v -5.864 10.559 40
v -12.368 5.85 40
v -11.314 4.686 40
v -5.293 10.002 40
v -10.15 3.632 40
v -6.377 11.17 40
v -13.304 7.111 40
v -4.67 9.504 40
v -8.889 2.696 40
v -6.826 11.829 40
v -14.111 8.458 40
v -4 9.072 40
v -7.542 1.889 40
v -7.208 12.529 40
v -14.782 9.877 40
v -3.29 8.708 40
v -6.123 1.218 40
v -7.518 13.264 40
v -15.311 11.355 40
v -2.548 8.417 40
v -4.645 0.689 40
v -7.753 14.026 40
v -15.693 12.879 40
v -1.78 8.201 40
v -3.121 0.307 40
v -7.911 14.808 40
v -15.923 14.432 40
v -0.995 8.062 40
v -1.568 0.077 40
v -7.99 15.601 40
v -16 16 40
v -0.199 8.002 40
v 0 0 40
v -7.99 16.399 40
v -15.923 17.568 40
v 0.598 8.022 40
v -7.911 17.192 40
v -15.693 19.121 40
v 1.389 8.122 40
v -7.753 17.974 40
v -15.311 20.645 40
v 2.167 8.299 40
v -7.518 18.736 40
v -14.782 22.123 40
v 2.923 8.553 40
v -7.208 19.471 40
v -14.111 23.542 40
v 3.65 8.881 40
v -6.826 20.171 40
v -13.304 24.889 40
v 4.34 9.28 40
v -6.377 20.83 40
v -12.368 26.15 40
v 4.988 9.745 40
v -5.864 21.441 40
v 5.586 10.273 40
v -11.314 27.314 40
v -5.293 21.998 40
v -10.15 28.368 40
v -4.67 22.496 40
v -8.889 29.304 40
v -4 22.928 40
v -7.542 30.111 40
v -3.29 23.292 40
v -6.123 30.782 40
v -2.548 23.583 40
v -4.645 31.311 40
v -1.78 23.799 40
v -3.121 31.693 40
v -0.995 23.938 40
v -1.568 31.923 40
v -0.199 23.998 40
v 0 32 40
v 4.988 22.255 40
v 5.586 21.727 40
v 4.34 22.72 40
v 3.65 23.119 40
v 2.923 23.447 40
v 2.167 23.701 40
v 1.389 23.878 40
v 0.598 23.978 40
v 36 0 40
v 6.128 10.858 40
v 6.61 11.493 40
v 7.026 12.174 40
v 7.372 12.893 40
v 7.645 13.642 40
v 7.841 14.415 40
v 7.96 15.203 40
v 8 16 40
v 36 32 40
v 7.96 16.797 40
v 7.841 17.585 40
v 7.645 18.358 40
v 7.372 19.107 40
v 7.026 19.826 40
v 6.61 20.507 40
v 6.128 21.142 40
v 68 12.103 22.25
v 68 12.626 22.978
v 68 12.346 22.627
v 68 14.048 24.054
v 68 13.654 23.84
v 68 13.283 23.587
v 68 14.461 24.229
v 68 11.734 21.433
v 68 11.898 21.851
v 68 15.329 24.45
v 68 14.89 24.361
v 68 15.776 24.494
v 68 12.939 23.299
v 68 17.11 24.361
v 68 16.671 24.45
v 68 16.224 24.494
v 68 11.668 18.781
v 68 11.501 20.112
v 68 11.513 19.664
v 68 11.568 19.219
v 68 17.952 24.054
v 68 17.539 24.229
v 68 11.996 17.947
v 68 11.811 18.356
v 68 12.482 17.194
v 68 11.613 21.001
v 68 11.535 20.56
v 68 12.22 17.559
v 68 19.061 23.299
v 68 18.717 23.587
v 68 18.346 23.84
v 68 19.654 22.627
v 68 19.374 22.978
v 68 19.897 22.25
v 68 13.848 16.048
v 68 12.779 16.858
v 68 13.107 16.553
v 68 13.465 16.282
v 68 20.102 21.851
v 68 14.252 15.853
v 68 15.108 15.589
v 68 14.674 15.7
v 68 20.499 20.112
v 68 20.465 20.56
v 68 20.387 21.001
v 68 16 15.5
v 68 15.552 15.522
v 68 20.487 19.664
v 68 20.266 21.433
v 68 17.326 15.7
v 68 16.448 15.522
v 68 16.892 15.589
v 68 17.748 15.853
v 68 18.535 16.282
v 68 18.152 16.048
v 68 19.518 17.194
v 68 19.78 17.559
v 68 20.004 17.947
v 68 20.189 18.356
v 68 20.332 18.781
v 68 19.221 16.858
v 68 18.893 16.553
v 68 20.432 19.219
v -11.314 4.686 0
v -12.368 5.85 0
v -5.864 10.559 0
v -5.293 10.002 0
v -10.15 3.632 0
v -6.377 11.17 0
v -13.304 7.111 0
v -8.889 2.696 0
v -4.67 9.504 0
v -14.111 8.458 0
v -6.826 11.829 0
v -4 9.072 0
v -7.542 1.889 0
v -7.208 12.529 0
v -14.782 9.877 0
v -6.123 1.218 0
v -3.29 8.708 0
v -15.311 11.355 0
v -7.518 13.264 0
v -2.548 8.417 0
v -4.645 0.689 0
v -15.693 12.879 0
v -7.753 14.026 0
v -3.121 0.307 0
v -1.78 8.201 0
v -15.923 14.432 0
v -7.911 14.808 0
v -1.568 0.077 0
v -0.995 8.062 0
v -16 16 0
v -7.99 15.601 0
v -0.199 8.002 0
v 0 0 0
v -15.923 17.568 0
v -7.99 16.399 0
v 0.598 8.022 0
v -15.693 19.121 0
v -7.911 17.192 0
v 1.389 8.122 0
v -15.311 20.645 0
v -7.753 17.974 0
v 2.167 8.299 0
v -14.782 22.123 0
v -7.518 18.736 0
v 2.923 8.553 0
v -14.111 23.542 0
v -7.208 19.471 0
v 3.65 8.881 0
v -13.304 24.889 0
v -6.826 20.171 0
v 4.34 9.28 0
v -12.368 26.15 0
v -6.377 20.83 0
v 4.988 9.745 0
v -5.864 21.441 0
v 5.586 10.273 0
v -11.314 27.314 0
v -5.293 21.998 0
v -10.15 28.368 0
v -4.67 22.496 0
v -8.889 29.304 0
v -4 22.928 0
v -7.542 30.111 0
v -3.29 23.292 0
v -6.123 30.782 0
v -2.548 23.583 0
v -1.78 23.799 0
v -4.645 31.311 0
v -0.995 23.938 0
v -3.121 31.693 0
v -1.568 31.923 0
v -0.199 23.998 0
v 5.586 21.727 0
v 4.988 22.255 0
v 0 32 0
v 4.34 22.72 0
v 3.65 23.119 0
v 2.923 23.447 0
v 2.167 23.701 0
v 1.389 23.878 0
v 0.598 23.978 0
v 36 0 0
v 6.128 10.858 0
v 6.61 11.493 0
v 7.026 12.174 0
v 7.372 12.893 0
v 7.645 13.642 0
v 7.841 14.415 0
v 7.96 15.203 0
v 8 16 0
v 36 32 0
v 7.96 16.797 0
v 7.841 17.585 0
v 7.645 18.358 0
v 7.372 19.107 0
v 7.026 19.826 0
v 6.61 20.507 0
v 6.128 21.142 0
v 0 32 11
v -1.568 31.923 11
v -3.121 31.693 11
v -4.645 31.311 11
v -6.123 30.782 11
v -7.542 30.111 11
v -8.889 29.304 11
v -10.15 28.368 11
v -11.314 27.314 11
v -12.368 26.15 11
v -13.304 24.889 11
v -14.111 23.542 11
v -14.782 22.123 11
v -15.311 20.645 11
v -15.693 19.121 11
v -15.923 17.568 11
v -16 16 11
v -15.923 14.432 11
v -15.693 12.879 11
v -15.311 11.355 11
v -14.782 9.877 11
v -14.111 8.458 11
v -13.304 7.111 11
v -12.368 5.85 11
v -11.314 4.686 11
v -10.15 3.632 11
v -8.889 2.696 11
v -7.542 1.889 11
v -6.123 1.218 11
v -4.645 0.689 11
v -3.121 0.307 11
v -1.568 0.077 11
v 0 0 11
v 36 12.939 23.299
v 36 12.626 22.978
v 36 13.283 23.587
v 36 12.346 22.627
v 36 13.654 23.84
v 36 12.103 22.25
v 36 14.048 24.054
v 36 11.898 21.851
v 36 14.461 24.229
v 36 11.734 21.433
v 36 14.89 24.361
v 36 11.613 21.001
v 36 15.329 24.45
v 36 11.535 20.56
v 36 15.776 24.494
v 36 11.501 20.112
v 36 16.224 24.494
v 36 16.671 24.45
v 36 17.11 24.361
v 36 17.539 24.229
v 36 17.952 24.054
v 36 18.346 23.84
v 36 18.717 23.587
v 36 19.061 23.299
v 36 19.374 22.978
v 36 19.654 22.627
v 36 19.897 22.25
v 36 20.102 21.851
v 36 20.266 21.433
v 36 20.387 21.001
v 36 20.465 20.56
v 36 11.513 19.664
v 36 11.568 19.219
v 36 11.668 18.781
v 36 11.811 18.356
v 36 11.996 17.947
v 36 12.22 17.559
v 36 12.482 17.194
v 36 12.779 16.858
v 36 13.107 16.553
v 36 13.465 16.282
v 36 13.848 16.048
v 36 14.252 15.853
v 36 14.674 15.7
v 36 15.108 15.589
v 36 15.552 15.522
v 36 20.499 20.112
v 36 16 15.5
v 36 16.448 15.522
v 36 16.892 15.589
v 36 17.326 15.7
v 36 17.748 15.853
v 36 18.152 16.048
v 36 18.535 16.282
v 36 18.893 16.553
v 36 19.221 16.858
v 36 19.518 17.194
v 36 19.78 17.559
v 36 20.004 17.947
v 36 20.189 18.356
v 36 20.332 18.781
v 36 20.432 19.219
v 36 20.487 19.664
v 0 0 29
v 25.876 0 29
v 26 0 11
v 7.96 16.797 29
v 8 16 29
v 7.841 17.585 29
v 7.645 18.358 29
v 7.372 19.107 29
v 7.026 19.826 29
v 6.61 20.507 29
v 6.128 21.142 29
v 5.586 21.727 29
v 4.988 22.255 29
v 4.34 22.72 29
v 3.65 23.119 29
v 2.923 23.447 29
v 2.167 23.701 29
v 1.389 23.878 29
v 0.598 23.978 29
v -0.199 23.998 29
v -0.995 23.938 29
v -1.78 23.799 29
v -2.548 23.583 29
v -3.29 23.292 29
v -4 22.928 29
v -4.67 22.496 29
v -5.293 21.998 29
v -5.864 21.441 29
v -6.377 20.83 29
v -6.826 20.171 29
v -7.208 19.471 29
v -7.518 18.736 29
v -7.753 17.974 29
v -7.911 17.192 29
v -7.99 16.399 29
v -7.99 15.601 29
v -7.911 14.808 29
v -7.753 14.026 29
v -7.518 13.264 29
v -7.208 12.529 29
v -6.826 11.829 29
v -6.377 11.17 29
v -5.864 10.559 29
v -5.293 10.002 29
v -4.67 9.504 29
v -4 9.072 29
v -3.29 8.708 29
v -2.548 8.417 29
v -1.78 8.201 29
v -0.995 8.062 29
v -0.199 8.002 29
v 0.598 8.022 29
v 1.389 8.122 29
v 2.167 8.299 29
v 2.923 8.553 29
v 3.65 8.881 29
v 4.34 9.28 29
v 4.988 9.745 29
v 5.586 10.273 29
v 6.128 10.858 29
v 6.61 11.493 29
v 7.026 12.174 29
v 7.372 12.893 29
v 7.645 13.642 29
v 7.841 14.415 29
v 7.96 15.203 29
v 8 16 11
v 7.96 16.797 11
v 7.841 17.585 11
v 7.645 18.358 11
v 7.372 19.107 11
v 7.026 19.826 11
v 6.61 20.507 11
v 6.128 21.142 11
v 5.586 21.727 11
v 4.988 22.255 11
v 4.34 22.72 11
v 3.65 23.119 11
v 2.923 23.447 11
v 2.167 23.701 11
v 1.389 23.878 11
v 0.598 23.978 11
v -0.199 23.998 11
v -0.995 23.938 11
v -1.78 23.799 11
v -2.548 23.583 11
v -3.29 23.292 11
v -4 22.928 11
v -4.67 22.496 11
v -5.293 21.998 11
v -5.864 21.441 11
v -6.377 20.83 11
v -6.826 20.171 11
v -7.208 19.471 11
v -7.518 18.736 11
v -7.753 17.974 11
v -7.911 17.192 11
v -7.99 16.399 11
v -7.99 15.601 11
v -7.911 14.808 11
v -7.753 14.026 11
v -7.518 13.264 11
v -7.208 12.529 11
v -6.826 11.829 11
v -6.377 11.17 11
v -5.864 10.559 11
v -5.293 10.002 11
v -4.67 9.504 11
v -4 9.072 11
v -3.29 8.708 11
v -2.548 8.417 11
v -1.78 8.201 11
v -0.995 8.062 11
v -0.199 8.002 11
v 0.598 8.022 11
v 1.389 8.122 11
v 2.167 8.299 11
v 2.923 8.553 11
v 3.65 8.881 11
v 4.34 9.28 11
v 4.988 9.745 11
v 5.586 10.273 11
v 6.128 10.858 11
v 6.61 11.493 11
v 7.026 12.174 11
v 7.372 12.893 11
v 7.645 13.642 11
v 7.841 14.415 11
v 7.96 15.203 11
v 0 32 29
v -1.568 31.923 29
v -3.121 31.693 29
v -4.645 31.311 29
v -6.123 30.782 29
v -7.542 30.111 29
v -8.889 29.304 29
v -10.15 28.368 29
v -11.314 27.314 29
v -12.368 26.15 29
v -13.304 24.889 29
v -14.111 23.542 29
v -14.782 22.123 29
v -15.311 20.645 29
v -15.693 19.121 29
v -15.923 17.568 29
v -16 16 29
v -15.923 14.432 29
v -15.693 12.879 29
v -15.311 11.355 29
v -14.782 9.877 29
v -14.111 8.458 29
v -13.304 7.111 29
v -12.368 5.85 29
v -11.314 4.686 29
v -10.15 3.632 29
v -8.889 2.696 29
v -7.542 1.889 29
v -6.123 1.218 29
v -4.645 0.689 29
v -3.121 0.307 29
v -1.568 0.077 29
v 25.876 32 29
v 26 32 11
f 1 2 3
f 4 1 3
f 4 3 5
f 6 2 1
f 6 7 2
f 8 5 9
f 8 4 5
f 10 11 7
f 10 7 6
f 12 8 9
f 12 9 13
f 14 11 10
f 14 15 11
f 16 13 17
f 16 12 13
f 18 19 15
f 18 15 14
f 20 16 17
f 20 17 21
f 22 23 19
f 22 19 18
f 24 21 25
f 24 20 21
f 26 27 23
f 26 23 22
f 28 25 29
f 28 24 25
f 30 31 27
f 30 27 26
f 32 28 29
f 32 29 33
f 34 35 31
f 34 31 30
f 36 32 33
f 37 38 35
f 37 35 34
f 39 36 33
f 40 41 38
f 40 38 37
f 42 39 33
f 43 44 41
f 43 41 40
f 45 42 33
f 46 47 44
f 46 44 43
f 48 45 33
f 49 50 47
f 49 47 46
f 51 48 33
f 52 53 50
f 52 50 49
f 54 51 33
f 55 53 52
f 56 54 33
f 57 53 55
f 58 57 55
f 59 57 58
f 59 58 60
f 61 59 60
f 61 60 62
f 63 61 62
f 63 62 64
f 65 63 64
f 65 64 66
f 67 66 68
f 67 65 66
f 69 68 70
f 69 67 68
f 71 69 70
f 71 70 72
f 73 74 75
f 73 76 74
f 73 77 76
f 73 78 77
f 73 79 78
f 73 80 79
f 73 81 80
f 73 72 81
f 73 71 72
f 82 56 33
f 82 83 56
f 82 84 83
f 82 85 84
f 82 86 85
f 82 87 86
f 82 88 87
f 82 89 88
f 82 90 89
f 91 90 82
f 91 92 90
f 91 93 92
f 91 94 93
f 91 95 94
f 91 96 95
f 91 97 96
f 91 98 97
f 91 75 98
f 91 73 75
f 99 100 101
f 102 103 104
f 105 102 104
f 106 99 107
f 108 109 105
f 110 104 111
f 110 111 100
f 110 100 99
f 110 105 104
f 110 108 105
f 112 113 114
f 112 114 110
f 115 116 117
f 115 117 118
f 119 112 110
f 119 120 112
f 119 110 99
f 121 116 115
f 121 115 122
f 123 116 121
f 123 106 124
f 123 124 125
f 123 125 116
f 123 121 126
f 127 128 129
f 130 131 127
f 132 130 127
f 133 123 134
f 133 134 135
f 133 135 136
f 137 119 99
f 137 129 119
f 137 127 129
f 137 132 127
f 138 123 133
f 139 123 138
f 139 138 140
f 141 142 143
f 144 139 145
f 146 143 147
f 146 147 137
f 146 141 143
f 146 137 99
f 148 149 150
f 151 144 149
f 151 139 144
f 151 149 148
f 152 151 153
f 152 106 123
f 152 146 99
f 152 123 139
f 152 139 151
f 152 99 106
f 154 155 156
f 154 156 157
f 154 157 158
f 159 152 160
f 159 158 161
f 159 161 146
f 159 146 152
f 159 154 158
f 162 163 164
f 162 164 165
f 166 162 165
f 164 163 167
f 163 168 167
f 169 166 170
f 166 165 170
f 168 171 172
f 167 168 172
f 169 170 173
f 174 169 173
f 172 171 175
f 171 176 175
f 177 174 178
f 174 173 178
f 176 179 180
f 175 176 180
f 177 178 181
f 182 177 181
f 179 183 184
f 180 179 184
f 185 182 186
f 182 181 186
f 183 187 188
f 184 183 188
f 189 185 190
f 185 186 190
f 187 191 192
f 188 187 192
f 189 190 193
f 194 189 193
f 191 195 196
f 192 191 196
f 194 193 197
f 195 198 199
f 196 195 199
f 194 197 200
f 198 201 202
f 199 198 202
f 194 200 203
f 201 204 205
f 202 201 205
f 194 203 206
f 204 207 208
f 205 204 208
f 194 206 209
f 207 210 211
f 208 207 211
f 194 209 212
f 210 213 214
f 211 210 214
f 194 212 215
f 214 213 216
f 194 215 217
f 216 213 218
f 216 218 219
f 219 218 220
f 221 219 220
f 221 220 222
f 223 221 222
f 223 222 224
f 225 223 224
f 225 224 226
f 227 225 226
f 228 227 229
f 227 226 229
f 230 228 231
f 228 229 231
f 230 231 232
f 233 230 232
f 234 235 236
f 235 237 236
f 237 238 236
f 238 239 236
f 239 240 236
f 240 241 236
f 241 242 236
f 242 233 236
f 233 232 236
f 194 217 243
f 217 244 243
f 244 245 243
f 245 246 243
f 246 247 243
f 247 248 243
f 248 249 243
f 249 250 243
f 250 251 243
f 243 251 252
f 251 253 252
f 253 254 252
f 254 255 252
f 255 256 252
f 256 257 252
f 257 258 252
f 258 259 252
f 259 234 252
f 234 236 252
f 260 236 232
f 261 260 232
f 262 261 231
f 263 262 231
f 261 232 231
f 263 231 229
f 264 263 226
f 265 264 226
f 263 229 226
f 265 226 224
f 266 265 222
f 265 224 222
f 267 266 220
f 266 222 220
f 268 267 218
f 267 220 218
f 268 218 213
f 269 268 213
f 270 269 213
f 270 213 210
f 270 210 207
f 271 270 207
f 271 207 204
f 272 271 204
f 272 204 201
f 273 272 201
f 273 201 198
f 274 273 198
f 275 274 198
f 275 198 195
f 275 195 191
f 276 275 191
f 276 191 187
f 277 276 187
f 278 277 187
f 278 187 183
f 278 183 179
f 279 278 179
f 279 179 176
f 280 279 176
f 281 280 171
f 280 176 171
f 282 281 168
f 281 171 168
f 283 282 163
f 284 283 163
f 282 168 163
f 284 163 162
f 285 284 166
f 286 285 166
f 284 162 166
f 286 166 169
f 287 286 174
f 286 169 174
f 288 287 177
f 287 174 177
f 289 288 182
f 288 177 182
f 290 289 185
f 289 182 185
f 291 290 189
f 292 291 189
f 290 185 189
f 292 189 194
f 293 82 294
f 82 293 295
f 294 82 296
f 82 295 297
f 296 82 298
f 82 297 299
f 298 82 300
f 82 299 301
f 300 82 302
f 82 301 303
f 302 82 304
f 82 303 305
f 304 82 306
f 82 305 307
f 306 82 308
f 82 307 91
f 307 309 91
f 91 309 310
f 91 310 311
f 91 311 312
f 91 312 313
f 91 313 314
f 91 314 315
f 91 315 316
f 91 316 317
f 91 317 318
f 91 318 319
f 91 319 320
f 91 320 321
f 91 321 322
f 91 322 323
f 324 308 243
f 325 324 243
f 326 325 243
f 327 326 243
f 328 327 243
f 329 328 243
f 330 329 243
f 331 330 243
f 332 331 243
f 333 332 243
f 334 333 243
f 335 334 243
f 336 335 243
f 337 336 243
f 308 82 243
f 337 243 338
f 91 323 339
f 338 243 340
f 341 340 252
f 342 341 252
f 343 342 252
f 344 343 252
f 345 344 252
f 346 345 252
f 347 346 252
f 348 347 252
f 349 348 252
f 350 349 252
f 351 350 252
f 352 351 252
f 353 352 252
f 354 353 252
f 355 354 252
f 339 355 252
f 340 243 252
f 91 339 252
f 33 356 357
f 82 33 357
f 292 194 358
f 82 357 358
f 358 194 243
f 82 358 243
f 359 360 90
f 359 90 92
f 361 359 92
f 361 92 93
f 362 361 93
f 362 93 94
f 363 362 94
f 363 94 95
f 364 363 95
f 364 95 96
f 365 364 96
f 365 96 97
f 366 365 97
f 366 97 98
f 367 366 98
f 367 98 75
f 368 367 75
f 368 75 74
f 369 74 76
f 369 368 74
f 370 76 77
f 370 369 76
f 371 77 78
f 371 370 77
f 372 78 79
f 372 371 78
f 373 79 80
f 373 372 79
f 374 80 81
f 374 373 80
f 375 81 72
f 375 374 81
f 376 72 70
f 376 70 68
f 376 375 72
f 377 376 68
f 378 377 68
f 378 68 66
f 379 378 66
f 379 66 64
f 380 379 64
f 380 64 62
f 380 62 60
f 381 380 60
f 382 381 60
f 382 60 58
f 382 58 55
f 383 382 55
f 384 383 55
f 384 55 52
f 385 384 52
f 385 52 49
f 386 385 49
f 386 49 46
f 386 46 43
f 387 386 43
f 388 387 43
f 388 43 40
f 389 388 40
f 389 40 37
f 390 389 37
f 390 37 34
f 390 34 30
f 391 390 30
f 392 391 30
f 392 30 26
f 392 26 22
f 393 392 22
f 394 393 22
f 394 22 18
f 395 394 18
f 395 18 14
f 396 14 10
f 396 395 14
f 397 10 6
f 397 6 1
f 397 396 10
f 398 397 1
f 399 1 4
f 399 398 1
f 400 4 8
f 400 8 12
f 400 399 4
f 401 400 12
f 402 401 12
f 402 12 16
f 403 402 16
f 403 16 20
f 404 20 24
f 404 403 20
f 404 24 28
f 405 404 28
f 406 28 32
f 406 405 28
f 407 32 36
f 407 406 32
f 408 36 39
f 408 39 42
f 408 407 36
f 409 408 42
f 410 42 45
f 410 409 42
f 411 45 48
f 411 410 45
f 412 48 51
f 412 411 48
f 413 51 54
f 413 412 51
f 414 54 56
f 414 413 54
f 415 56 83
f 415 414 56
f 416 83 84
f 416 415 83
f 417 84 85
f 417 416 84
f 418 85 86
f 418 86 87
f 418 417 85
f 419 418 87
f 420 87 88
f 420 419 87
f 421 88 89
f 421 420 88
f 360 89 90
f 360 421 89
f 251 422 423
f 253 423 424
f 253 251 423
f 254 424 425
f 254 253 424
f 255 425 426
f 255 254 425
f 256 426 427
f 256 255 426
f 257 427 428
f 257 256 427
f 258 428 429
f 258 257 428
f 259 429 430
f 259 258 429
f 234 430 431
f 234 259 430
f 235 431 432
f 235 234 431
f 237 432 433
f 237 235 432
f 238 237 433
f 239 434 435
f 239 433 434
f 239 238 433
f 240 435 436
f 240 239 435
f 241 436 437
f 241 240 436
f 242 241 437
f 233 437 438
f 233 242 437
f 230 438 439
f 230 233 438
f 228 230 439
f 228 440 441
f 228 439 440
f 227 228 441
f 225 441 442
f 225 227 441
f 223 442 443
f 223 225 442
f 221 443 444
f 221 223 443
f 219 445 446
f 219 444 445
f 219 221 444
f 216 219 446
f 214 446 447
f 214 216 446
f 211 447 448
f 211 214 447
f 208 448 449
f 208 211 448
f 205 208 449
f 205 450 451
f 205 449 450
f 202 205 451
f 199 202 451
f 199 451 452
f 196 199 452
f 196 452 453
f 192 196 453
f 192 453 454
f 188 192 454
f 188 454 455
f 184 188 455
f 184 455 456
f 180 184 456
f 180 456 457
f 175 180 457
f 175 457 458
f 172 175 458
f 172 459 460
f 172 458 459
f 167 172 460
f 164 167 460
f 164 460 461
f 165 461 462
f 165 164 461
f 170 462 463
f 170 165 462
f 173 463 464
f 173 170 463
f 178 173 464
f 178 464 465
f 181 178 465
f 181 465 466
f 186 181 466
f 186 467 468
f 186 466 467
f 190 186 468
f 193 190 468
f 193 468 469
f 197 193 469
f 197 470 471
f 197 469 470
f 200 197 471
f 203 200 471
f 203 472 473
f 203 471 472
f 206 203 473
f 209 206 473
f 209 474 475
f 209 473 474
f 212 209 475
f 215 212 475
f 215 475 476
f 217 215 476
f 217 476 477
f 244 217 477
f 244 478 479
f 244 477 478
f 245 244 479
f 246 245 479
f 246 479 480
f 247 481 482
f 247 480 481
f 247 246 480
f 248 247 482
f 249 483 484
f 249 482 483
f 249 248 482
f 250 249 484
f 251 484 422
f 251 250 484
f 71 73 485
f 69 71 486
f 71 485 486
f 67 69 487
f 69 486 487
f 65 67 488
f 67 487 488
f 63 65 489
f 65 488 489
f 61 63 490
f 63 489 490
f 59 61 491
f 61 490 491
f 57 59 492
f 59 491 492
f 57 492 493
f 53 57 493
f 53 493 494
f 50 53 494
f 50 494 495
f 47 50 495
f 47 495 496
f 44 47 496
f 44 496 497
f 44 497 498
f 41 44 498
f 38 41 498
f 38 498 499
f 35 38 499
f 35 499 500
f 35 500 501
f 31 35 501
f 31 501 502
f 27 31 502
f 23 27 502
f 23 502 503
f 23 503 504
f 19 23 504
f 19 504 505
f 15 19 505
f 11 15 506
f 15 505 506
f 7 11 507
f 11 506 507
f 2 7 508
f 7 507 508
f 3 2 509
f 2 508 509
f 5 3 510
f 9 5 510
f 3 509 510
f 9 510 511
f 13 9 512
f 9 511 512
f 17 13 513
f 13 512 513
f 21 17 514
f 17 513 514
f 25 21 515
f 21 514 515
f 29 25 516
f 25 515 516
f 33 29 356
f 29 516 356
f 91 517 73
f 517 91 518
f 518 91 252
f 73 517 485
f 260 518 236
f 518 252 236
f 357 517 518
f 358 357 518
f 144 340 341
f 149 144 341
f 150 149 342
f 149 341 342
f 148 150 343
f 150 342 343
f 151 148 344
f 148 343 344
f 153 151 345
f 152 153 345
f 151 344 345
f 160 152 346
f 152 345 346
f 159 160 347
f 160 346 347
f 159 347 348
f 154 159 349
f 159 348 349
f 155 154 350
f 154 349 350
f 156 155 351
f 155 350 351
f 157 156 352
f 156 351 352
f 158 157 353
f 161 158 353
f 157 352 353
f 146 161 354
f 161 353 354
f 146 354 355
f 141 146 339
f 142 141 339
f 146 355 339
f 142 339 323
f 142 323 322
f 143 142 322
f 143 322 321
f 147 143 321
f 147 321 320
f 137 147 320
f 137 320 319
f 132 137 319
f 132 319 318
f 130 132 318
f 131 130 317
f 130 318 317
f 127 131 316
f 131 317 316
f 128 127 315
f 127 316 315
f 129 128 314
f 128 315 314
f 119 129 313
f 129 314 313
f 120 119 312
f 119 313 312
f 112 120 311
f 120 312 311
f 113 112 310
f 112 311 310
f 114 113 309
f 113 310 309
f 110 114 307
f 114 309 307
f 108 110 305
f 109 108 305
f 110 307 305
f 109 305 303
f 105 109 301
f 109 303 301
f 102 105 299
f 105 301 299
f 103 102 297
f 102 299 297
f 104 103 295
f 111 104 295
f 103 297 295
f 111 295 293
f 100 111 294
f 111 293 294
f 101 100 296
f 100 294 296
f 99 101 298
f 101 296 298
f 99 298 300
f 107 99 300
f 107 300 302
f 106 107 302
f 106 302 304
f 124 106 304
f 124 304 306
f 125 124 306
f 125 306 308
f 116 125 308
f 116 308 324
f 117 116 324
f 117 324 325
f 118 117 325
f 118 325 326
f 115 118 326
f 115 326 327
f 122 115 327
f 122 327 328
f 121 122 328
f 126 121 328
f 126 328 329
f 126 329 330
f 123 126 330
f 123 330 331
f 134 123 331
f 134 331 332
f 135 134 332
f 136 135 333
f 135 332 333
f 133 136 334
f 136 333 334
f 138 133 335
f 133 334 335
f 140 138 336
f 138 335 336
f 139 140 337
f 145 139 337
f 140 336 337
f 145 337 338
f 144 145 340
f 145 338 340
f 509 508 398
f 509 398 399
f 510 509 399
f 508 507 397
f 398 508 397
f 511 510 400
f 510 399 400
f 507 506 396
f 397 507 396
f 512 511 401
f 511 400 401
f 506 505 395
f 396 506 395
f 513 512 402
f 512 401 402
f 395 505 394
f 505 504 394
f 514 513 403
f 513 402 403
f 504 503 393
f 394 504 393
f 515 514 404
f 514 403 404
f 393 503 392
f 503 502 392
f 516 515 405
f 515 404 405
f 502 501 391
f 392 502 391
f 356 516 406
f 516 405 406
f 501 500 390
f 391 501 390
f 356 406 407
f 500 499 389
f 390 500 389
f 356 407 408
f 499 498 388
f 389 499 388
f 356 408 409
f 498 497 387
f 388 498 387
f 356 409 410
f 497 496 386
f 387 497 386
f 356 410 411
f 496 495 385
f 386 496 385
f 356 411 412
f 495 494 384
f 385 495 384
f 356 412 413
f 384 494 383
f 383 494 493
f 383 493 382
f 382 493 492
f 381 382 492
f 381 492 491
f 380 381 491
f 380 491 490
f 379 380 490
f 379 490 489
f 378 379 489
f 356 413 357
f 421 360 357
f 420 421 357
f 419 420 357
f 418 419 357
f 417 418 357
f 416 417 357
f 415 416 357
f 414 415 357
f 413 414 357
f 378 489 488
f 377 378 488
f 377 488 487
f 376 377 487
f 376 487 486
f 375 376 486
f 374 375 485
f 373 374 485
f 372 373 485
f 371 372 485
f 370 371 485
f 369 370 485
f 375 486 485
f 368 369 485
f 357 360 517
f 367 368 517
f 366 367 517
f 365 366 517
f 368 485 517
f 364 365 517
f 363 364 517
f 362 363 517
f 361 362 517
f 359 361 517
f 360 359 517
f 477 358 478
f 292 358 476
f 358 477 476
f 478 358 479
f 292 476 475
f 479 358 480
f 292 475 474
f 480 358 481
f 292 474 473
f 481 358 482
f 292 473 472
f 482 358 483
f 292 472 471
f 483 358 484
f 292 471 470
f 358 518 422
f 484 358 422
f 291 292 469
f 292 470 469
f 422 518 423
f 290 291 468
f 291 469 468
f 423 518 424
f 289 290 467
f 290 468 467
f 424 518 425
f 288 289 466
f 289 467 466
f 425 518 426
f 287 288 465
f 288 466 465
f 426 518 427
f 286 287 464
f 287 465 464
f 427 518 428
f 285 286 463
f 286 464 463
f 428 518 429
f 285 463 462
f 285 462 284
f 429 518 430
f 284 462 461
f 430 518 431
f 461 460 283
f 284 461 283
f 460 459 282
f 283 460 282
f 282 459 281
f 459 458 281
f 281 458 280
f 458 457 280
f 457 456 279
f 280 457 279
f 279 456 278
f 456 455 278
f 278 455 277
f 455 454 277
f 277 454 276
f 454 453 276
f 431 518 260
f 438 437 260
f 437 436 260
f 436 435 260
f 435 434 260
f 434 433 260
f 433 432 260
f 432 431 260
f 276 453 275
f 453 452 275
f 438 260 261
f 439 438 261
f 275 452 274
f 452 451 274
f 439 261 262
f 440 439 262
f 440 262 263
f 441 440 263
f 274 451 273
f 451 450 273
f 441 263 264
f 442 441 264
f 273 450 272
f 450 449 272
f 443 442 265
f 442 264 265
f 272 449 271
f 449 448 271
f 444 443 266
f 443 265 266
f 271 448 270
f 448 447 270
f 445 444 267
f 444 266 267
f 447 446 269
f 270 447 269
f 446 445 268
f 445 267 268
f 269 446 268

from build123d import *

# Parameters (mm, degrees)
SKETCH2_R           = 8
BOSS_EXTRUDE1_DEPTH = 40
CUT_EXTRUDE1_DEPTH  = 40
SKETCH4_R           = 4.5
BOSS_EXTRUDE2_DEPTH = 32


with BuildPart() as part:
    # Sketch2 → Boss-Extrude1 (new body)
    with BuildSketch(Plane.XY):
        with BuildLine():
            Line((0, 0), (36, 0))
            Line((36, 0), (36, 32))
            Line((36, 32), (0, 32))
            ThreePointArc((0, 32), (-16, 16), (0, 0))
        make_face()
        with Locations((0, 16)):
            Circle(SKETCH2_R, mode=Mode.SUBTRACT)
    extrude(amount=BOSS_EXTRUDE1_DEPTH)

    # Sketch3 → Cut-Extrude1 (cut)
    with BuildSketch(Plane(origin=(0, 32, 0), x_dir=(1, 0, 0), z_dir=(0, 1, 0))):
        Polygon((26, -11), (0, -11), (0, -29), (25.876198368, -29), align=None)
        Polygon((0, -11), (-16, -11), (-16.123801632, -29), (0, -29), align=None)
    extrude(amount=-CUT_EXTRUDE1_DEPTH, mode=Mode.SUBTRACT)

    # Sketch4 → Boss-Extrude2 (add)
    with BuildSketch(Plane(origin=(36, 0, 0), x_dir=(0, 0, -1), z_dir=(1, 0, 0))):
        with Locations((-20, 16)):
            Circle(SKETCH4_R)
    extrude(amount=BOSS_EXTRUDE2_DEPTH)


solid = part.part
